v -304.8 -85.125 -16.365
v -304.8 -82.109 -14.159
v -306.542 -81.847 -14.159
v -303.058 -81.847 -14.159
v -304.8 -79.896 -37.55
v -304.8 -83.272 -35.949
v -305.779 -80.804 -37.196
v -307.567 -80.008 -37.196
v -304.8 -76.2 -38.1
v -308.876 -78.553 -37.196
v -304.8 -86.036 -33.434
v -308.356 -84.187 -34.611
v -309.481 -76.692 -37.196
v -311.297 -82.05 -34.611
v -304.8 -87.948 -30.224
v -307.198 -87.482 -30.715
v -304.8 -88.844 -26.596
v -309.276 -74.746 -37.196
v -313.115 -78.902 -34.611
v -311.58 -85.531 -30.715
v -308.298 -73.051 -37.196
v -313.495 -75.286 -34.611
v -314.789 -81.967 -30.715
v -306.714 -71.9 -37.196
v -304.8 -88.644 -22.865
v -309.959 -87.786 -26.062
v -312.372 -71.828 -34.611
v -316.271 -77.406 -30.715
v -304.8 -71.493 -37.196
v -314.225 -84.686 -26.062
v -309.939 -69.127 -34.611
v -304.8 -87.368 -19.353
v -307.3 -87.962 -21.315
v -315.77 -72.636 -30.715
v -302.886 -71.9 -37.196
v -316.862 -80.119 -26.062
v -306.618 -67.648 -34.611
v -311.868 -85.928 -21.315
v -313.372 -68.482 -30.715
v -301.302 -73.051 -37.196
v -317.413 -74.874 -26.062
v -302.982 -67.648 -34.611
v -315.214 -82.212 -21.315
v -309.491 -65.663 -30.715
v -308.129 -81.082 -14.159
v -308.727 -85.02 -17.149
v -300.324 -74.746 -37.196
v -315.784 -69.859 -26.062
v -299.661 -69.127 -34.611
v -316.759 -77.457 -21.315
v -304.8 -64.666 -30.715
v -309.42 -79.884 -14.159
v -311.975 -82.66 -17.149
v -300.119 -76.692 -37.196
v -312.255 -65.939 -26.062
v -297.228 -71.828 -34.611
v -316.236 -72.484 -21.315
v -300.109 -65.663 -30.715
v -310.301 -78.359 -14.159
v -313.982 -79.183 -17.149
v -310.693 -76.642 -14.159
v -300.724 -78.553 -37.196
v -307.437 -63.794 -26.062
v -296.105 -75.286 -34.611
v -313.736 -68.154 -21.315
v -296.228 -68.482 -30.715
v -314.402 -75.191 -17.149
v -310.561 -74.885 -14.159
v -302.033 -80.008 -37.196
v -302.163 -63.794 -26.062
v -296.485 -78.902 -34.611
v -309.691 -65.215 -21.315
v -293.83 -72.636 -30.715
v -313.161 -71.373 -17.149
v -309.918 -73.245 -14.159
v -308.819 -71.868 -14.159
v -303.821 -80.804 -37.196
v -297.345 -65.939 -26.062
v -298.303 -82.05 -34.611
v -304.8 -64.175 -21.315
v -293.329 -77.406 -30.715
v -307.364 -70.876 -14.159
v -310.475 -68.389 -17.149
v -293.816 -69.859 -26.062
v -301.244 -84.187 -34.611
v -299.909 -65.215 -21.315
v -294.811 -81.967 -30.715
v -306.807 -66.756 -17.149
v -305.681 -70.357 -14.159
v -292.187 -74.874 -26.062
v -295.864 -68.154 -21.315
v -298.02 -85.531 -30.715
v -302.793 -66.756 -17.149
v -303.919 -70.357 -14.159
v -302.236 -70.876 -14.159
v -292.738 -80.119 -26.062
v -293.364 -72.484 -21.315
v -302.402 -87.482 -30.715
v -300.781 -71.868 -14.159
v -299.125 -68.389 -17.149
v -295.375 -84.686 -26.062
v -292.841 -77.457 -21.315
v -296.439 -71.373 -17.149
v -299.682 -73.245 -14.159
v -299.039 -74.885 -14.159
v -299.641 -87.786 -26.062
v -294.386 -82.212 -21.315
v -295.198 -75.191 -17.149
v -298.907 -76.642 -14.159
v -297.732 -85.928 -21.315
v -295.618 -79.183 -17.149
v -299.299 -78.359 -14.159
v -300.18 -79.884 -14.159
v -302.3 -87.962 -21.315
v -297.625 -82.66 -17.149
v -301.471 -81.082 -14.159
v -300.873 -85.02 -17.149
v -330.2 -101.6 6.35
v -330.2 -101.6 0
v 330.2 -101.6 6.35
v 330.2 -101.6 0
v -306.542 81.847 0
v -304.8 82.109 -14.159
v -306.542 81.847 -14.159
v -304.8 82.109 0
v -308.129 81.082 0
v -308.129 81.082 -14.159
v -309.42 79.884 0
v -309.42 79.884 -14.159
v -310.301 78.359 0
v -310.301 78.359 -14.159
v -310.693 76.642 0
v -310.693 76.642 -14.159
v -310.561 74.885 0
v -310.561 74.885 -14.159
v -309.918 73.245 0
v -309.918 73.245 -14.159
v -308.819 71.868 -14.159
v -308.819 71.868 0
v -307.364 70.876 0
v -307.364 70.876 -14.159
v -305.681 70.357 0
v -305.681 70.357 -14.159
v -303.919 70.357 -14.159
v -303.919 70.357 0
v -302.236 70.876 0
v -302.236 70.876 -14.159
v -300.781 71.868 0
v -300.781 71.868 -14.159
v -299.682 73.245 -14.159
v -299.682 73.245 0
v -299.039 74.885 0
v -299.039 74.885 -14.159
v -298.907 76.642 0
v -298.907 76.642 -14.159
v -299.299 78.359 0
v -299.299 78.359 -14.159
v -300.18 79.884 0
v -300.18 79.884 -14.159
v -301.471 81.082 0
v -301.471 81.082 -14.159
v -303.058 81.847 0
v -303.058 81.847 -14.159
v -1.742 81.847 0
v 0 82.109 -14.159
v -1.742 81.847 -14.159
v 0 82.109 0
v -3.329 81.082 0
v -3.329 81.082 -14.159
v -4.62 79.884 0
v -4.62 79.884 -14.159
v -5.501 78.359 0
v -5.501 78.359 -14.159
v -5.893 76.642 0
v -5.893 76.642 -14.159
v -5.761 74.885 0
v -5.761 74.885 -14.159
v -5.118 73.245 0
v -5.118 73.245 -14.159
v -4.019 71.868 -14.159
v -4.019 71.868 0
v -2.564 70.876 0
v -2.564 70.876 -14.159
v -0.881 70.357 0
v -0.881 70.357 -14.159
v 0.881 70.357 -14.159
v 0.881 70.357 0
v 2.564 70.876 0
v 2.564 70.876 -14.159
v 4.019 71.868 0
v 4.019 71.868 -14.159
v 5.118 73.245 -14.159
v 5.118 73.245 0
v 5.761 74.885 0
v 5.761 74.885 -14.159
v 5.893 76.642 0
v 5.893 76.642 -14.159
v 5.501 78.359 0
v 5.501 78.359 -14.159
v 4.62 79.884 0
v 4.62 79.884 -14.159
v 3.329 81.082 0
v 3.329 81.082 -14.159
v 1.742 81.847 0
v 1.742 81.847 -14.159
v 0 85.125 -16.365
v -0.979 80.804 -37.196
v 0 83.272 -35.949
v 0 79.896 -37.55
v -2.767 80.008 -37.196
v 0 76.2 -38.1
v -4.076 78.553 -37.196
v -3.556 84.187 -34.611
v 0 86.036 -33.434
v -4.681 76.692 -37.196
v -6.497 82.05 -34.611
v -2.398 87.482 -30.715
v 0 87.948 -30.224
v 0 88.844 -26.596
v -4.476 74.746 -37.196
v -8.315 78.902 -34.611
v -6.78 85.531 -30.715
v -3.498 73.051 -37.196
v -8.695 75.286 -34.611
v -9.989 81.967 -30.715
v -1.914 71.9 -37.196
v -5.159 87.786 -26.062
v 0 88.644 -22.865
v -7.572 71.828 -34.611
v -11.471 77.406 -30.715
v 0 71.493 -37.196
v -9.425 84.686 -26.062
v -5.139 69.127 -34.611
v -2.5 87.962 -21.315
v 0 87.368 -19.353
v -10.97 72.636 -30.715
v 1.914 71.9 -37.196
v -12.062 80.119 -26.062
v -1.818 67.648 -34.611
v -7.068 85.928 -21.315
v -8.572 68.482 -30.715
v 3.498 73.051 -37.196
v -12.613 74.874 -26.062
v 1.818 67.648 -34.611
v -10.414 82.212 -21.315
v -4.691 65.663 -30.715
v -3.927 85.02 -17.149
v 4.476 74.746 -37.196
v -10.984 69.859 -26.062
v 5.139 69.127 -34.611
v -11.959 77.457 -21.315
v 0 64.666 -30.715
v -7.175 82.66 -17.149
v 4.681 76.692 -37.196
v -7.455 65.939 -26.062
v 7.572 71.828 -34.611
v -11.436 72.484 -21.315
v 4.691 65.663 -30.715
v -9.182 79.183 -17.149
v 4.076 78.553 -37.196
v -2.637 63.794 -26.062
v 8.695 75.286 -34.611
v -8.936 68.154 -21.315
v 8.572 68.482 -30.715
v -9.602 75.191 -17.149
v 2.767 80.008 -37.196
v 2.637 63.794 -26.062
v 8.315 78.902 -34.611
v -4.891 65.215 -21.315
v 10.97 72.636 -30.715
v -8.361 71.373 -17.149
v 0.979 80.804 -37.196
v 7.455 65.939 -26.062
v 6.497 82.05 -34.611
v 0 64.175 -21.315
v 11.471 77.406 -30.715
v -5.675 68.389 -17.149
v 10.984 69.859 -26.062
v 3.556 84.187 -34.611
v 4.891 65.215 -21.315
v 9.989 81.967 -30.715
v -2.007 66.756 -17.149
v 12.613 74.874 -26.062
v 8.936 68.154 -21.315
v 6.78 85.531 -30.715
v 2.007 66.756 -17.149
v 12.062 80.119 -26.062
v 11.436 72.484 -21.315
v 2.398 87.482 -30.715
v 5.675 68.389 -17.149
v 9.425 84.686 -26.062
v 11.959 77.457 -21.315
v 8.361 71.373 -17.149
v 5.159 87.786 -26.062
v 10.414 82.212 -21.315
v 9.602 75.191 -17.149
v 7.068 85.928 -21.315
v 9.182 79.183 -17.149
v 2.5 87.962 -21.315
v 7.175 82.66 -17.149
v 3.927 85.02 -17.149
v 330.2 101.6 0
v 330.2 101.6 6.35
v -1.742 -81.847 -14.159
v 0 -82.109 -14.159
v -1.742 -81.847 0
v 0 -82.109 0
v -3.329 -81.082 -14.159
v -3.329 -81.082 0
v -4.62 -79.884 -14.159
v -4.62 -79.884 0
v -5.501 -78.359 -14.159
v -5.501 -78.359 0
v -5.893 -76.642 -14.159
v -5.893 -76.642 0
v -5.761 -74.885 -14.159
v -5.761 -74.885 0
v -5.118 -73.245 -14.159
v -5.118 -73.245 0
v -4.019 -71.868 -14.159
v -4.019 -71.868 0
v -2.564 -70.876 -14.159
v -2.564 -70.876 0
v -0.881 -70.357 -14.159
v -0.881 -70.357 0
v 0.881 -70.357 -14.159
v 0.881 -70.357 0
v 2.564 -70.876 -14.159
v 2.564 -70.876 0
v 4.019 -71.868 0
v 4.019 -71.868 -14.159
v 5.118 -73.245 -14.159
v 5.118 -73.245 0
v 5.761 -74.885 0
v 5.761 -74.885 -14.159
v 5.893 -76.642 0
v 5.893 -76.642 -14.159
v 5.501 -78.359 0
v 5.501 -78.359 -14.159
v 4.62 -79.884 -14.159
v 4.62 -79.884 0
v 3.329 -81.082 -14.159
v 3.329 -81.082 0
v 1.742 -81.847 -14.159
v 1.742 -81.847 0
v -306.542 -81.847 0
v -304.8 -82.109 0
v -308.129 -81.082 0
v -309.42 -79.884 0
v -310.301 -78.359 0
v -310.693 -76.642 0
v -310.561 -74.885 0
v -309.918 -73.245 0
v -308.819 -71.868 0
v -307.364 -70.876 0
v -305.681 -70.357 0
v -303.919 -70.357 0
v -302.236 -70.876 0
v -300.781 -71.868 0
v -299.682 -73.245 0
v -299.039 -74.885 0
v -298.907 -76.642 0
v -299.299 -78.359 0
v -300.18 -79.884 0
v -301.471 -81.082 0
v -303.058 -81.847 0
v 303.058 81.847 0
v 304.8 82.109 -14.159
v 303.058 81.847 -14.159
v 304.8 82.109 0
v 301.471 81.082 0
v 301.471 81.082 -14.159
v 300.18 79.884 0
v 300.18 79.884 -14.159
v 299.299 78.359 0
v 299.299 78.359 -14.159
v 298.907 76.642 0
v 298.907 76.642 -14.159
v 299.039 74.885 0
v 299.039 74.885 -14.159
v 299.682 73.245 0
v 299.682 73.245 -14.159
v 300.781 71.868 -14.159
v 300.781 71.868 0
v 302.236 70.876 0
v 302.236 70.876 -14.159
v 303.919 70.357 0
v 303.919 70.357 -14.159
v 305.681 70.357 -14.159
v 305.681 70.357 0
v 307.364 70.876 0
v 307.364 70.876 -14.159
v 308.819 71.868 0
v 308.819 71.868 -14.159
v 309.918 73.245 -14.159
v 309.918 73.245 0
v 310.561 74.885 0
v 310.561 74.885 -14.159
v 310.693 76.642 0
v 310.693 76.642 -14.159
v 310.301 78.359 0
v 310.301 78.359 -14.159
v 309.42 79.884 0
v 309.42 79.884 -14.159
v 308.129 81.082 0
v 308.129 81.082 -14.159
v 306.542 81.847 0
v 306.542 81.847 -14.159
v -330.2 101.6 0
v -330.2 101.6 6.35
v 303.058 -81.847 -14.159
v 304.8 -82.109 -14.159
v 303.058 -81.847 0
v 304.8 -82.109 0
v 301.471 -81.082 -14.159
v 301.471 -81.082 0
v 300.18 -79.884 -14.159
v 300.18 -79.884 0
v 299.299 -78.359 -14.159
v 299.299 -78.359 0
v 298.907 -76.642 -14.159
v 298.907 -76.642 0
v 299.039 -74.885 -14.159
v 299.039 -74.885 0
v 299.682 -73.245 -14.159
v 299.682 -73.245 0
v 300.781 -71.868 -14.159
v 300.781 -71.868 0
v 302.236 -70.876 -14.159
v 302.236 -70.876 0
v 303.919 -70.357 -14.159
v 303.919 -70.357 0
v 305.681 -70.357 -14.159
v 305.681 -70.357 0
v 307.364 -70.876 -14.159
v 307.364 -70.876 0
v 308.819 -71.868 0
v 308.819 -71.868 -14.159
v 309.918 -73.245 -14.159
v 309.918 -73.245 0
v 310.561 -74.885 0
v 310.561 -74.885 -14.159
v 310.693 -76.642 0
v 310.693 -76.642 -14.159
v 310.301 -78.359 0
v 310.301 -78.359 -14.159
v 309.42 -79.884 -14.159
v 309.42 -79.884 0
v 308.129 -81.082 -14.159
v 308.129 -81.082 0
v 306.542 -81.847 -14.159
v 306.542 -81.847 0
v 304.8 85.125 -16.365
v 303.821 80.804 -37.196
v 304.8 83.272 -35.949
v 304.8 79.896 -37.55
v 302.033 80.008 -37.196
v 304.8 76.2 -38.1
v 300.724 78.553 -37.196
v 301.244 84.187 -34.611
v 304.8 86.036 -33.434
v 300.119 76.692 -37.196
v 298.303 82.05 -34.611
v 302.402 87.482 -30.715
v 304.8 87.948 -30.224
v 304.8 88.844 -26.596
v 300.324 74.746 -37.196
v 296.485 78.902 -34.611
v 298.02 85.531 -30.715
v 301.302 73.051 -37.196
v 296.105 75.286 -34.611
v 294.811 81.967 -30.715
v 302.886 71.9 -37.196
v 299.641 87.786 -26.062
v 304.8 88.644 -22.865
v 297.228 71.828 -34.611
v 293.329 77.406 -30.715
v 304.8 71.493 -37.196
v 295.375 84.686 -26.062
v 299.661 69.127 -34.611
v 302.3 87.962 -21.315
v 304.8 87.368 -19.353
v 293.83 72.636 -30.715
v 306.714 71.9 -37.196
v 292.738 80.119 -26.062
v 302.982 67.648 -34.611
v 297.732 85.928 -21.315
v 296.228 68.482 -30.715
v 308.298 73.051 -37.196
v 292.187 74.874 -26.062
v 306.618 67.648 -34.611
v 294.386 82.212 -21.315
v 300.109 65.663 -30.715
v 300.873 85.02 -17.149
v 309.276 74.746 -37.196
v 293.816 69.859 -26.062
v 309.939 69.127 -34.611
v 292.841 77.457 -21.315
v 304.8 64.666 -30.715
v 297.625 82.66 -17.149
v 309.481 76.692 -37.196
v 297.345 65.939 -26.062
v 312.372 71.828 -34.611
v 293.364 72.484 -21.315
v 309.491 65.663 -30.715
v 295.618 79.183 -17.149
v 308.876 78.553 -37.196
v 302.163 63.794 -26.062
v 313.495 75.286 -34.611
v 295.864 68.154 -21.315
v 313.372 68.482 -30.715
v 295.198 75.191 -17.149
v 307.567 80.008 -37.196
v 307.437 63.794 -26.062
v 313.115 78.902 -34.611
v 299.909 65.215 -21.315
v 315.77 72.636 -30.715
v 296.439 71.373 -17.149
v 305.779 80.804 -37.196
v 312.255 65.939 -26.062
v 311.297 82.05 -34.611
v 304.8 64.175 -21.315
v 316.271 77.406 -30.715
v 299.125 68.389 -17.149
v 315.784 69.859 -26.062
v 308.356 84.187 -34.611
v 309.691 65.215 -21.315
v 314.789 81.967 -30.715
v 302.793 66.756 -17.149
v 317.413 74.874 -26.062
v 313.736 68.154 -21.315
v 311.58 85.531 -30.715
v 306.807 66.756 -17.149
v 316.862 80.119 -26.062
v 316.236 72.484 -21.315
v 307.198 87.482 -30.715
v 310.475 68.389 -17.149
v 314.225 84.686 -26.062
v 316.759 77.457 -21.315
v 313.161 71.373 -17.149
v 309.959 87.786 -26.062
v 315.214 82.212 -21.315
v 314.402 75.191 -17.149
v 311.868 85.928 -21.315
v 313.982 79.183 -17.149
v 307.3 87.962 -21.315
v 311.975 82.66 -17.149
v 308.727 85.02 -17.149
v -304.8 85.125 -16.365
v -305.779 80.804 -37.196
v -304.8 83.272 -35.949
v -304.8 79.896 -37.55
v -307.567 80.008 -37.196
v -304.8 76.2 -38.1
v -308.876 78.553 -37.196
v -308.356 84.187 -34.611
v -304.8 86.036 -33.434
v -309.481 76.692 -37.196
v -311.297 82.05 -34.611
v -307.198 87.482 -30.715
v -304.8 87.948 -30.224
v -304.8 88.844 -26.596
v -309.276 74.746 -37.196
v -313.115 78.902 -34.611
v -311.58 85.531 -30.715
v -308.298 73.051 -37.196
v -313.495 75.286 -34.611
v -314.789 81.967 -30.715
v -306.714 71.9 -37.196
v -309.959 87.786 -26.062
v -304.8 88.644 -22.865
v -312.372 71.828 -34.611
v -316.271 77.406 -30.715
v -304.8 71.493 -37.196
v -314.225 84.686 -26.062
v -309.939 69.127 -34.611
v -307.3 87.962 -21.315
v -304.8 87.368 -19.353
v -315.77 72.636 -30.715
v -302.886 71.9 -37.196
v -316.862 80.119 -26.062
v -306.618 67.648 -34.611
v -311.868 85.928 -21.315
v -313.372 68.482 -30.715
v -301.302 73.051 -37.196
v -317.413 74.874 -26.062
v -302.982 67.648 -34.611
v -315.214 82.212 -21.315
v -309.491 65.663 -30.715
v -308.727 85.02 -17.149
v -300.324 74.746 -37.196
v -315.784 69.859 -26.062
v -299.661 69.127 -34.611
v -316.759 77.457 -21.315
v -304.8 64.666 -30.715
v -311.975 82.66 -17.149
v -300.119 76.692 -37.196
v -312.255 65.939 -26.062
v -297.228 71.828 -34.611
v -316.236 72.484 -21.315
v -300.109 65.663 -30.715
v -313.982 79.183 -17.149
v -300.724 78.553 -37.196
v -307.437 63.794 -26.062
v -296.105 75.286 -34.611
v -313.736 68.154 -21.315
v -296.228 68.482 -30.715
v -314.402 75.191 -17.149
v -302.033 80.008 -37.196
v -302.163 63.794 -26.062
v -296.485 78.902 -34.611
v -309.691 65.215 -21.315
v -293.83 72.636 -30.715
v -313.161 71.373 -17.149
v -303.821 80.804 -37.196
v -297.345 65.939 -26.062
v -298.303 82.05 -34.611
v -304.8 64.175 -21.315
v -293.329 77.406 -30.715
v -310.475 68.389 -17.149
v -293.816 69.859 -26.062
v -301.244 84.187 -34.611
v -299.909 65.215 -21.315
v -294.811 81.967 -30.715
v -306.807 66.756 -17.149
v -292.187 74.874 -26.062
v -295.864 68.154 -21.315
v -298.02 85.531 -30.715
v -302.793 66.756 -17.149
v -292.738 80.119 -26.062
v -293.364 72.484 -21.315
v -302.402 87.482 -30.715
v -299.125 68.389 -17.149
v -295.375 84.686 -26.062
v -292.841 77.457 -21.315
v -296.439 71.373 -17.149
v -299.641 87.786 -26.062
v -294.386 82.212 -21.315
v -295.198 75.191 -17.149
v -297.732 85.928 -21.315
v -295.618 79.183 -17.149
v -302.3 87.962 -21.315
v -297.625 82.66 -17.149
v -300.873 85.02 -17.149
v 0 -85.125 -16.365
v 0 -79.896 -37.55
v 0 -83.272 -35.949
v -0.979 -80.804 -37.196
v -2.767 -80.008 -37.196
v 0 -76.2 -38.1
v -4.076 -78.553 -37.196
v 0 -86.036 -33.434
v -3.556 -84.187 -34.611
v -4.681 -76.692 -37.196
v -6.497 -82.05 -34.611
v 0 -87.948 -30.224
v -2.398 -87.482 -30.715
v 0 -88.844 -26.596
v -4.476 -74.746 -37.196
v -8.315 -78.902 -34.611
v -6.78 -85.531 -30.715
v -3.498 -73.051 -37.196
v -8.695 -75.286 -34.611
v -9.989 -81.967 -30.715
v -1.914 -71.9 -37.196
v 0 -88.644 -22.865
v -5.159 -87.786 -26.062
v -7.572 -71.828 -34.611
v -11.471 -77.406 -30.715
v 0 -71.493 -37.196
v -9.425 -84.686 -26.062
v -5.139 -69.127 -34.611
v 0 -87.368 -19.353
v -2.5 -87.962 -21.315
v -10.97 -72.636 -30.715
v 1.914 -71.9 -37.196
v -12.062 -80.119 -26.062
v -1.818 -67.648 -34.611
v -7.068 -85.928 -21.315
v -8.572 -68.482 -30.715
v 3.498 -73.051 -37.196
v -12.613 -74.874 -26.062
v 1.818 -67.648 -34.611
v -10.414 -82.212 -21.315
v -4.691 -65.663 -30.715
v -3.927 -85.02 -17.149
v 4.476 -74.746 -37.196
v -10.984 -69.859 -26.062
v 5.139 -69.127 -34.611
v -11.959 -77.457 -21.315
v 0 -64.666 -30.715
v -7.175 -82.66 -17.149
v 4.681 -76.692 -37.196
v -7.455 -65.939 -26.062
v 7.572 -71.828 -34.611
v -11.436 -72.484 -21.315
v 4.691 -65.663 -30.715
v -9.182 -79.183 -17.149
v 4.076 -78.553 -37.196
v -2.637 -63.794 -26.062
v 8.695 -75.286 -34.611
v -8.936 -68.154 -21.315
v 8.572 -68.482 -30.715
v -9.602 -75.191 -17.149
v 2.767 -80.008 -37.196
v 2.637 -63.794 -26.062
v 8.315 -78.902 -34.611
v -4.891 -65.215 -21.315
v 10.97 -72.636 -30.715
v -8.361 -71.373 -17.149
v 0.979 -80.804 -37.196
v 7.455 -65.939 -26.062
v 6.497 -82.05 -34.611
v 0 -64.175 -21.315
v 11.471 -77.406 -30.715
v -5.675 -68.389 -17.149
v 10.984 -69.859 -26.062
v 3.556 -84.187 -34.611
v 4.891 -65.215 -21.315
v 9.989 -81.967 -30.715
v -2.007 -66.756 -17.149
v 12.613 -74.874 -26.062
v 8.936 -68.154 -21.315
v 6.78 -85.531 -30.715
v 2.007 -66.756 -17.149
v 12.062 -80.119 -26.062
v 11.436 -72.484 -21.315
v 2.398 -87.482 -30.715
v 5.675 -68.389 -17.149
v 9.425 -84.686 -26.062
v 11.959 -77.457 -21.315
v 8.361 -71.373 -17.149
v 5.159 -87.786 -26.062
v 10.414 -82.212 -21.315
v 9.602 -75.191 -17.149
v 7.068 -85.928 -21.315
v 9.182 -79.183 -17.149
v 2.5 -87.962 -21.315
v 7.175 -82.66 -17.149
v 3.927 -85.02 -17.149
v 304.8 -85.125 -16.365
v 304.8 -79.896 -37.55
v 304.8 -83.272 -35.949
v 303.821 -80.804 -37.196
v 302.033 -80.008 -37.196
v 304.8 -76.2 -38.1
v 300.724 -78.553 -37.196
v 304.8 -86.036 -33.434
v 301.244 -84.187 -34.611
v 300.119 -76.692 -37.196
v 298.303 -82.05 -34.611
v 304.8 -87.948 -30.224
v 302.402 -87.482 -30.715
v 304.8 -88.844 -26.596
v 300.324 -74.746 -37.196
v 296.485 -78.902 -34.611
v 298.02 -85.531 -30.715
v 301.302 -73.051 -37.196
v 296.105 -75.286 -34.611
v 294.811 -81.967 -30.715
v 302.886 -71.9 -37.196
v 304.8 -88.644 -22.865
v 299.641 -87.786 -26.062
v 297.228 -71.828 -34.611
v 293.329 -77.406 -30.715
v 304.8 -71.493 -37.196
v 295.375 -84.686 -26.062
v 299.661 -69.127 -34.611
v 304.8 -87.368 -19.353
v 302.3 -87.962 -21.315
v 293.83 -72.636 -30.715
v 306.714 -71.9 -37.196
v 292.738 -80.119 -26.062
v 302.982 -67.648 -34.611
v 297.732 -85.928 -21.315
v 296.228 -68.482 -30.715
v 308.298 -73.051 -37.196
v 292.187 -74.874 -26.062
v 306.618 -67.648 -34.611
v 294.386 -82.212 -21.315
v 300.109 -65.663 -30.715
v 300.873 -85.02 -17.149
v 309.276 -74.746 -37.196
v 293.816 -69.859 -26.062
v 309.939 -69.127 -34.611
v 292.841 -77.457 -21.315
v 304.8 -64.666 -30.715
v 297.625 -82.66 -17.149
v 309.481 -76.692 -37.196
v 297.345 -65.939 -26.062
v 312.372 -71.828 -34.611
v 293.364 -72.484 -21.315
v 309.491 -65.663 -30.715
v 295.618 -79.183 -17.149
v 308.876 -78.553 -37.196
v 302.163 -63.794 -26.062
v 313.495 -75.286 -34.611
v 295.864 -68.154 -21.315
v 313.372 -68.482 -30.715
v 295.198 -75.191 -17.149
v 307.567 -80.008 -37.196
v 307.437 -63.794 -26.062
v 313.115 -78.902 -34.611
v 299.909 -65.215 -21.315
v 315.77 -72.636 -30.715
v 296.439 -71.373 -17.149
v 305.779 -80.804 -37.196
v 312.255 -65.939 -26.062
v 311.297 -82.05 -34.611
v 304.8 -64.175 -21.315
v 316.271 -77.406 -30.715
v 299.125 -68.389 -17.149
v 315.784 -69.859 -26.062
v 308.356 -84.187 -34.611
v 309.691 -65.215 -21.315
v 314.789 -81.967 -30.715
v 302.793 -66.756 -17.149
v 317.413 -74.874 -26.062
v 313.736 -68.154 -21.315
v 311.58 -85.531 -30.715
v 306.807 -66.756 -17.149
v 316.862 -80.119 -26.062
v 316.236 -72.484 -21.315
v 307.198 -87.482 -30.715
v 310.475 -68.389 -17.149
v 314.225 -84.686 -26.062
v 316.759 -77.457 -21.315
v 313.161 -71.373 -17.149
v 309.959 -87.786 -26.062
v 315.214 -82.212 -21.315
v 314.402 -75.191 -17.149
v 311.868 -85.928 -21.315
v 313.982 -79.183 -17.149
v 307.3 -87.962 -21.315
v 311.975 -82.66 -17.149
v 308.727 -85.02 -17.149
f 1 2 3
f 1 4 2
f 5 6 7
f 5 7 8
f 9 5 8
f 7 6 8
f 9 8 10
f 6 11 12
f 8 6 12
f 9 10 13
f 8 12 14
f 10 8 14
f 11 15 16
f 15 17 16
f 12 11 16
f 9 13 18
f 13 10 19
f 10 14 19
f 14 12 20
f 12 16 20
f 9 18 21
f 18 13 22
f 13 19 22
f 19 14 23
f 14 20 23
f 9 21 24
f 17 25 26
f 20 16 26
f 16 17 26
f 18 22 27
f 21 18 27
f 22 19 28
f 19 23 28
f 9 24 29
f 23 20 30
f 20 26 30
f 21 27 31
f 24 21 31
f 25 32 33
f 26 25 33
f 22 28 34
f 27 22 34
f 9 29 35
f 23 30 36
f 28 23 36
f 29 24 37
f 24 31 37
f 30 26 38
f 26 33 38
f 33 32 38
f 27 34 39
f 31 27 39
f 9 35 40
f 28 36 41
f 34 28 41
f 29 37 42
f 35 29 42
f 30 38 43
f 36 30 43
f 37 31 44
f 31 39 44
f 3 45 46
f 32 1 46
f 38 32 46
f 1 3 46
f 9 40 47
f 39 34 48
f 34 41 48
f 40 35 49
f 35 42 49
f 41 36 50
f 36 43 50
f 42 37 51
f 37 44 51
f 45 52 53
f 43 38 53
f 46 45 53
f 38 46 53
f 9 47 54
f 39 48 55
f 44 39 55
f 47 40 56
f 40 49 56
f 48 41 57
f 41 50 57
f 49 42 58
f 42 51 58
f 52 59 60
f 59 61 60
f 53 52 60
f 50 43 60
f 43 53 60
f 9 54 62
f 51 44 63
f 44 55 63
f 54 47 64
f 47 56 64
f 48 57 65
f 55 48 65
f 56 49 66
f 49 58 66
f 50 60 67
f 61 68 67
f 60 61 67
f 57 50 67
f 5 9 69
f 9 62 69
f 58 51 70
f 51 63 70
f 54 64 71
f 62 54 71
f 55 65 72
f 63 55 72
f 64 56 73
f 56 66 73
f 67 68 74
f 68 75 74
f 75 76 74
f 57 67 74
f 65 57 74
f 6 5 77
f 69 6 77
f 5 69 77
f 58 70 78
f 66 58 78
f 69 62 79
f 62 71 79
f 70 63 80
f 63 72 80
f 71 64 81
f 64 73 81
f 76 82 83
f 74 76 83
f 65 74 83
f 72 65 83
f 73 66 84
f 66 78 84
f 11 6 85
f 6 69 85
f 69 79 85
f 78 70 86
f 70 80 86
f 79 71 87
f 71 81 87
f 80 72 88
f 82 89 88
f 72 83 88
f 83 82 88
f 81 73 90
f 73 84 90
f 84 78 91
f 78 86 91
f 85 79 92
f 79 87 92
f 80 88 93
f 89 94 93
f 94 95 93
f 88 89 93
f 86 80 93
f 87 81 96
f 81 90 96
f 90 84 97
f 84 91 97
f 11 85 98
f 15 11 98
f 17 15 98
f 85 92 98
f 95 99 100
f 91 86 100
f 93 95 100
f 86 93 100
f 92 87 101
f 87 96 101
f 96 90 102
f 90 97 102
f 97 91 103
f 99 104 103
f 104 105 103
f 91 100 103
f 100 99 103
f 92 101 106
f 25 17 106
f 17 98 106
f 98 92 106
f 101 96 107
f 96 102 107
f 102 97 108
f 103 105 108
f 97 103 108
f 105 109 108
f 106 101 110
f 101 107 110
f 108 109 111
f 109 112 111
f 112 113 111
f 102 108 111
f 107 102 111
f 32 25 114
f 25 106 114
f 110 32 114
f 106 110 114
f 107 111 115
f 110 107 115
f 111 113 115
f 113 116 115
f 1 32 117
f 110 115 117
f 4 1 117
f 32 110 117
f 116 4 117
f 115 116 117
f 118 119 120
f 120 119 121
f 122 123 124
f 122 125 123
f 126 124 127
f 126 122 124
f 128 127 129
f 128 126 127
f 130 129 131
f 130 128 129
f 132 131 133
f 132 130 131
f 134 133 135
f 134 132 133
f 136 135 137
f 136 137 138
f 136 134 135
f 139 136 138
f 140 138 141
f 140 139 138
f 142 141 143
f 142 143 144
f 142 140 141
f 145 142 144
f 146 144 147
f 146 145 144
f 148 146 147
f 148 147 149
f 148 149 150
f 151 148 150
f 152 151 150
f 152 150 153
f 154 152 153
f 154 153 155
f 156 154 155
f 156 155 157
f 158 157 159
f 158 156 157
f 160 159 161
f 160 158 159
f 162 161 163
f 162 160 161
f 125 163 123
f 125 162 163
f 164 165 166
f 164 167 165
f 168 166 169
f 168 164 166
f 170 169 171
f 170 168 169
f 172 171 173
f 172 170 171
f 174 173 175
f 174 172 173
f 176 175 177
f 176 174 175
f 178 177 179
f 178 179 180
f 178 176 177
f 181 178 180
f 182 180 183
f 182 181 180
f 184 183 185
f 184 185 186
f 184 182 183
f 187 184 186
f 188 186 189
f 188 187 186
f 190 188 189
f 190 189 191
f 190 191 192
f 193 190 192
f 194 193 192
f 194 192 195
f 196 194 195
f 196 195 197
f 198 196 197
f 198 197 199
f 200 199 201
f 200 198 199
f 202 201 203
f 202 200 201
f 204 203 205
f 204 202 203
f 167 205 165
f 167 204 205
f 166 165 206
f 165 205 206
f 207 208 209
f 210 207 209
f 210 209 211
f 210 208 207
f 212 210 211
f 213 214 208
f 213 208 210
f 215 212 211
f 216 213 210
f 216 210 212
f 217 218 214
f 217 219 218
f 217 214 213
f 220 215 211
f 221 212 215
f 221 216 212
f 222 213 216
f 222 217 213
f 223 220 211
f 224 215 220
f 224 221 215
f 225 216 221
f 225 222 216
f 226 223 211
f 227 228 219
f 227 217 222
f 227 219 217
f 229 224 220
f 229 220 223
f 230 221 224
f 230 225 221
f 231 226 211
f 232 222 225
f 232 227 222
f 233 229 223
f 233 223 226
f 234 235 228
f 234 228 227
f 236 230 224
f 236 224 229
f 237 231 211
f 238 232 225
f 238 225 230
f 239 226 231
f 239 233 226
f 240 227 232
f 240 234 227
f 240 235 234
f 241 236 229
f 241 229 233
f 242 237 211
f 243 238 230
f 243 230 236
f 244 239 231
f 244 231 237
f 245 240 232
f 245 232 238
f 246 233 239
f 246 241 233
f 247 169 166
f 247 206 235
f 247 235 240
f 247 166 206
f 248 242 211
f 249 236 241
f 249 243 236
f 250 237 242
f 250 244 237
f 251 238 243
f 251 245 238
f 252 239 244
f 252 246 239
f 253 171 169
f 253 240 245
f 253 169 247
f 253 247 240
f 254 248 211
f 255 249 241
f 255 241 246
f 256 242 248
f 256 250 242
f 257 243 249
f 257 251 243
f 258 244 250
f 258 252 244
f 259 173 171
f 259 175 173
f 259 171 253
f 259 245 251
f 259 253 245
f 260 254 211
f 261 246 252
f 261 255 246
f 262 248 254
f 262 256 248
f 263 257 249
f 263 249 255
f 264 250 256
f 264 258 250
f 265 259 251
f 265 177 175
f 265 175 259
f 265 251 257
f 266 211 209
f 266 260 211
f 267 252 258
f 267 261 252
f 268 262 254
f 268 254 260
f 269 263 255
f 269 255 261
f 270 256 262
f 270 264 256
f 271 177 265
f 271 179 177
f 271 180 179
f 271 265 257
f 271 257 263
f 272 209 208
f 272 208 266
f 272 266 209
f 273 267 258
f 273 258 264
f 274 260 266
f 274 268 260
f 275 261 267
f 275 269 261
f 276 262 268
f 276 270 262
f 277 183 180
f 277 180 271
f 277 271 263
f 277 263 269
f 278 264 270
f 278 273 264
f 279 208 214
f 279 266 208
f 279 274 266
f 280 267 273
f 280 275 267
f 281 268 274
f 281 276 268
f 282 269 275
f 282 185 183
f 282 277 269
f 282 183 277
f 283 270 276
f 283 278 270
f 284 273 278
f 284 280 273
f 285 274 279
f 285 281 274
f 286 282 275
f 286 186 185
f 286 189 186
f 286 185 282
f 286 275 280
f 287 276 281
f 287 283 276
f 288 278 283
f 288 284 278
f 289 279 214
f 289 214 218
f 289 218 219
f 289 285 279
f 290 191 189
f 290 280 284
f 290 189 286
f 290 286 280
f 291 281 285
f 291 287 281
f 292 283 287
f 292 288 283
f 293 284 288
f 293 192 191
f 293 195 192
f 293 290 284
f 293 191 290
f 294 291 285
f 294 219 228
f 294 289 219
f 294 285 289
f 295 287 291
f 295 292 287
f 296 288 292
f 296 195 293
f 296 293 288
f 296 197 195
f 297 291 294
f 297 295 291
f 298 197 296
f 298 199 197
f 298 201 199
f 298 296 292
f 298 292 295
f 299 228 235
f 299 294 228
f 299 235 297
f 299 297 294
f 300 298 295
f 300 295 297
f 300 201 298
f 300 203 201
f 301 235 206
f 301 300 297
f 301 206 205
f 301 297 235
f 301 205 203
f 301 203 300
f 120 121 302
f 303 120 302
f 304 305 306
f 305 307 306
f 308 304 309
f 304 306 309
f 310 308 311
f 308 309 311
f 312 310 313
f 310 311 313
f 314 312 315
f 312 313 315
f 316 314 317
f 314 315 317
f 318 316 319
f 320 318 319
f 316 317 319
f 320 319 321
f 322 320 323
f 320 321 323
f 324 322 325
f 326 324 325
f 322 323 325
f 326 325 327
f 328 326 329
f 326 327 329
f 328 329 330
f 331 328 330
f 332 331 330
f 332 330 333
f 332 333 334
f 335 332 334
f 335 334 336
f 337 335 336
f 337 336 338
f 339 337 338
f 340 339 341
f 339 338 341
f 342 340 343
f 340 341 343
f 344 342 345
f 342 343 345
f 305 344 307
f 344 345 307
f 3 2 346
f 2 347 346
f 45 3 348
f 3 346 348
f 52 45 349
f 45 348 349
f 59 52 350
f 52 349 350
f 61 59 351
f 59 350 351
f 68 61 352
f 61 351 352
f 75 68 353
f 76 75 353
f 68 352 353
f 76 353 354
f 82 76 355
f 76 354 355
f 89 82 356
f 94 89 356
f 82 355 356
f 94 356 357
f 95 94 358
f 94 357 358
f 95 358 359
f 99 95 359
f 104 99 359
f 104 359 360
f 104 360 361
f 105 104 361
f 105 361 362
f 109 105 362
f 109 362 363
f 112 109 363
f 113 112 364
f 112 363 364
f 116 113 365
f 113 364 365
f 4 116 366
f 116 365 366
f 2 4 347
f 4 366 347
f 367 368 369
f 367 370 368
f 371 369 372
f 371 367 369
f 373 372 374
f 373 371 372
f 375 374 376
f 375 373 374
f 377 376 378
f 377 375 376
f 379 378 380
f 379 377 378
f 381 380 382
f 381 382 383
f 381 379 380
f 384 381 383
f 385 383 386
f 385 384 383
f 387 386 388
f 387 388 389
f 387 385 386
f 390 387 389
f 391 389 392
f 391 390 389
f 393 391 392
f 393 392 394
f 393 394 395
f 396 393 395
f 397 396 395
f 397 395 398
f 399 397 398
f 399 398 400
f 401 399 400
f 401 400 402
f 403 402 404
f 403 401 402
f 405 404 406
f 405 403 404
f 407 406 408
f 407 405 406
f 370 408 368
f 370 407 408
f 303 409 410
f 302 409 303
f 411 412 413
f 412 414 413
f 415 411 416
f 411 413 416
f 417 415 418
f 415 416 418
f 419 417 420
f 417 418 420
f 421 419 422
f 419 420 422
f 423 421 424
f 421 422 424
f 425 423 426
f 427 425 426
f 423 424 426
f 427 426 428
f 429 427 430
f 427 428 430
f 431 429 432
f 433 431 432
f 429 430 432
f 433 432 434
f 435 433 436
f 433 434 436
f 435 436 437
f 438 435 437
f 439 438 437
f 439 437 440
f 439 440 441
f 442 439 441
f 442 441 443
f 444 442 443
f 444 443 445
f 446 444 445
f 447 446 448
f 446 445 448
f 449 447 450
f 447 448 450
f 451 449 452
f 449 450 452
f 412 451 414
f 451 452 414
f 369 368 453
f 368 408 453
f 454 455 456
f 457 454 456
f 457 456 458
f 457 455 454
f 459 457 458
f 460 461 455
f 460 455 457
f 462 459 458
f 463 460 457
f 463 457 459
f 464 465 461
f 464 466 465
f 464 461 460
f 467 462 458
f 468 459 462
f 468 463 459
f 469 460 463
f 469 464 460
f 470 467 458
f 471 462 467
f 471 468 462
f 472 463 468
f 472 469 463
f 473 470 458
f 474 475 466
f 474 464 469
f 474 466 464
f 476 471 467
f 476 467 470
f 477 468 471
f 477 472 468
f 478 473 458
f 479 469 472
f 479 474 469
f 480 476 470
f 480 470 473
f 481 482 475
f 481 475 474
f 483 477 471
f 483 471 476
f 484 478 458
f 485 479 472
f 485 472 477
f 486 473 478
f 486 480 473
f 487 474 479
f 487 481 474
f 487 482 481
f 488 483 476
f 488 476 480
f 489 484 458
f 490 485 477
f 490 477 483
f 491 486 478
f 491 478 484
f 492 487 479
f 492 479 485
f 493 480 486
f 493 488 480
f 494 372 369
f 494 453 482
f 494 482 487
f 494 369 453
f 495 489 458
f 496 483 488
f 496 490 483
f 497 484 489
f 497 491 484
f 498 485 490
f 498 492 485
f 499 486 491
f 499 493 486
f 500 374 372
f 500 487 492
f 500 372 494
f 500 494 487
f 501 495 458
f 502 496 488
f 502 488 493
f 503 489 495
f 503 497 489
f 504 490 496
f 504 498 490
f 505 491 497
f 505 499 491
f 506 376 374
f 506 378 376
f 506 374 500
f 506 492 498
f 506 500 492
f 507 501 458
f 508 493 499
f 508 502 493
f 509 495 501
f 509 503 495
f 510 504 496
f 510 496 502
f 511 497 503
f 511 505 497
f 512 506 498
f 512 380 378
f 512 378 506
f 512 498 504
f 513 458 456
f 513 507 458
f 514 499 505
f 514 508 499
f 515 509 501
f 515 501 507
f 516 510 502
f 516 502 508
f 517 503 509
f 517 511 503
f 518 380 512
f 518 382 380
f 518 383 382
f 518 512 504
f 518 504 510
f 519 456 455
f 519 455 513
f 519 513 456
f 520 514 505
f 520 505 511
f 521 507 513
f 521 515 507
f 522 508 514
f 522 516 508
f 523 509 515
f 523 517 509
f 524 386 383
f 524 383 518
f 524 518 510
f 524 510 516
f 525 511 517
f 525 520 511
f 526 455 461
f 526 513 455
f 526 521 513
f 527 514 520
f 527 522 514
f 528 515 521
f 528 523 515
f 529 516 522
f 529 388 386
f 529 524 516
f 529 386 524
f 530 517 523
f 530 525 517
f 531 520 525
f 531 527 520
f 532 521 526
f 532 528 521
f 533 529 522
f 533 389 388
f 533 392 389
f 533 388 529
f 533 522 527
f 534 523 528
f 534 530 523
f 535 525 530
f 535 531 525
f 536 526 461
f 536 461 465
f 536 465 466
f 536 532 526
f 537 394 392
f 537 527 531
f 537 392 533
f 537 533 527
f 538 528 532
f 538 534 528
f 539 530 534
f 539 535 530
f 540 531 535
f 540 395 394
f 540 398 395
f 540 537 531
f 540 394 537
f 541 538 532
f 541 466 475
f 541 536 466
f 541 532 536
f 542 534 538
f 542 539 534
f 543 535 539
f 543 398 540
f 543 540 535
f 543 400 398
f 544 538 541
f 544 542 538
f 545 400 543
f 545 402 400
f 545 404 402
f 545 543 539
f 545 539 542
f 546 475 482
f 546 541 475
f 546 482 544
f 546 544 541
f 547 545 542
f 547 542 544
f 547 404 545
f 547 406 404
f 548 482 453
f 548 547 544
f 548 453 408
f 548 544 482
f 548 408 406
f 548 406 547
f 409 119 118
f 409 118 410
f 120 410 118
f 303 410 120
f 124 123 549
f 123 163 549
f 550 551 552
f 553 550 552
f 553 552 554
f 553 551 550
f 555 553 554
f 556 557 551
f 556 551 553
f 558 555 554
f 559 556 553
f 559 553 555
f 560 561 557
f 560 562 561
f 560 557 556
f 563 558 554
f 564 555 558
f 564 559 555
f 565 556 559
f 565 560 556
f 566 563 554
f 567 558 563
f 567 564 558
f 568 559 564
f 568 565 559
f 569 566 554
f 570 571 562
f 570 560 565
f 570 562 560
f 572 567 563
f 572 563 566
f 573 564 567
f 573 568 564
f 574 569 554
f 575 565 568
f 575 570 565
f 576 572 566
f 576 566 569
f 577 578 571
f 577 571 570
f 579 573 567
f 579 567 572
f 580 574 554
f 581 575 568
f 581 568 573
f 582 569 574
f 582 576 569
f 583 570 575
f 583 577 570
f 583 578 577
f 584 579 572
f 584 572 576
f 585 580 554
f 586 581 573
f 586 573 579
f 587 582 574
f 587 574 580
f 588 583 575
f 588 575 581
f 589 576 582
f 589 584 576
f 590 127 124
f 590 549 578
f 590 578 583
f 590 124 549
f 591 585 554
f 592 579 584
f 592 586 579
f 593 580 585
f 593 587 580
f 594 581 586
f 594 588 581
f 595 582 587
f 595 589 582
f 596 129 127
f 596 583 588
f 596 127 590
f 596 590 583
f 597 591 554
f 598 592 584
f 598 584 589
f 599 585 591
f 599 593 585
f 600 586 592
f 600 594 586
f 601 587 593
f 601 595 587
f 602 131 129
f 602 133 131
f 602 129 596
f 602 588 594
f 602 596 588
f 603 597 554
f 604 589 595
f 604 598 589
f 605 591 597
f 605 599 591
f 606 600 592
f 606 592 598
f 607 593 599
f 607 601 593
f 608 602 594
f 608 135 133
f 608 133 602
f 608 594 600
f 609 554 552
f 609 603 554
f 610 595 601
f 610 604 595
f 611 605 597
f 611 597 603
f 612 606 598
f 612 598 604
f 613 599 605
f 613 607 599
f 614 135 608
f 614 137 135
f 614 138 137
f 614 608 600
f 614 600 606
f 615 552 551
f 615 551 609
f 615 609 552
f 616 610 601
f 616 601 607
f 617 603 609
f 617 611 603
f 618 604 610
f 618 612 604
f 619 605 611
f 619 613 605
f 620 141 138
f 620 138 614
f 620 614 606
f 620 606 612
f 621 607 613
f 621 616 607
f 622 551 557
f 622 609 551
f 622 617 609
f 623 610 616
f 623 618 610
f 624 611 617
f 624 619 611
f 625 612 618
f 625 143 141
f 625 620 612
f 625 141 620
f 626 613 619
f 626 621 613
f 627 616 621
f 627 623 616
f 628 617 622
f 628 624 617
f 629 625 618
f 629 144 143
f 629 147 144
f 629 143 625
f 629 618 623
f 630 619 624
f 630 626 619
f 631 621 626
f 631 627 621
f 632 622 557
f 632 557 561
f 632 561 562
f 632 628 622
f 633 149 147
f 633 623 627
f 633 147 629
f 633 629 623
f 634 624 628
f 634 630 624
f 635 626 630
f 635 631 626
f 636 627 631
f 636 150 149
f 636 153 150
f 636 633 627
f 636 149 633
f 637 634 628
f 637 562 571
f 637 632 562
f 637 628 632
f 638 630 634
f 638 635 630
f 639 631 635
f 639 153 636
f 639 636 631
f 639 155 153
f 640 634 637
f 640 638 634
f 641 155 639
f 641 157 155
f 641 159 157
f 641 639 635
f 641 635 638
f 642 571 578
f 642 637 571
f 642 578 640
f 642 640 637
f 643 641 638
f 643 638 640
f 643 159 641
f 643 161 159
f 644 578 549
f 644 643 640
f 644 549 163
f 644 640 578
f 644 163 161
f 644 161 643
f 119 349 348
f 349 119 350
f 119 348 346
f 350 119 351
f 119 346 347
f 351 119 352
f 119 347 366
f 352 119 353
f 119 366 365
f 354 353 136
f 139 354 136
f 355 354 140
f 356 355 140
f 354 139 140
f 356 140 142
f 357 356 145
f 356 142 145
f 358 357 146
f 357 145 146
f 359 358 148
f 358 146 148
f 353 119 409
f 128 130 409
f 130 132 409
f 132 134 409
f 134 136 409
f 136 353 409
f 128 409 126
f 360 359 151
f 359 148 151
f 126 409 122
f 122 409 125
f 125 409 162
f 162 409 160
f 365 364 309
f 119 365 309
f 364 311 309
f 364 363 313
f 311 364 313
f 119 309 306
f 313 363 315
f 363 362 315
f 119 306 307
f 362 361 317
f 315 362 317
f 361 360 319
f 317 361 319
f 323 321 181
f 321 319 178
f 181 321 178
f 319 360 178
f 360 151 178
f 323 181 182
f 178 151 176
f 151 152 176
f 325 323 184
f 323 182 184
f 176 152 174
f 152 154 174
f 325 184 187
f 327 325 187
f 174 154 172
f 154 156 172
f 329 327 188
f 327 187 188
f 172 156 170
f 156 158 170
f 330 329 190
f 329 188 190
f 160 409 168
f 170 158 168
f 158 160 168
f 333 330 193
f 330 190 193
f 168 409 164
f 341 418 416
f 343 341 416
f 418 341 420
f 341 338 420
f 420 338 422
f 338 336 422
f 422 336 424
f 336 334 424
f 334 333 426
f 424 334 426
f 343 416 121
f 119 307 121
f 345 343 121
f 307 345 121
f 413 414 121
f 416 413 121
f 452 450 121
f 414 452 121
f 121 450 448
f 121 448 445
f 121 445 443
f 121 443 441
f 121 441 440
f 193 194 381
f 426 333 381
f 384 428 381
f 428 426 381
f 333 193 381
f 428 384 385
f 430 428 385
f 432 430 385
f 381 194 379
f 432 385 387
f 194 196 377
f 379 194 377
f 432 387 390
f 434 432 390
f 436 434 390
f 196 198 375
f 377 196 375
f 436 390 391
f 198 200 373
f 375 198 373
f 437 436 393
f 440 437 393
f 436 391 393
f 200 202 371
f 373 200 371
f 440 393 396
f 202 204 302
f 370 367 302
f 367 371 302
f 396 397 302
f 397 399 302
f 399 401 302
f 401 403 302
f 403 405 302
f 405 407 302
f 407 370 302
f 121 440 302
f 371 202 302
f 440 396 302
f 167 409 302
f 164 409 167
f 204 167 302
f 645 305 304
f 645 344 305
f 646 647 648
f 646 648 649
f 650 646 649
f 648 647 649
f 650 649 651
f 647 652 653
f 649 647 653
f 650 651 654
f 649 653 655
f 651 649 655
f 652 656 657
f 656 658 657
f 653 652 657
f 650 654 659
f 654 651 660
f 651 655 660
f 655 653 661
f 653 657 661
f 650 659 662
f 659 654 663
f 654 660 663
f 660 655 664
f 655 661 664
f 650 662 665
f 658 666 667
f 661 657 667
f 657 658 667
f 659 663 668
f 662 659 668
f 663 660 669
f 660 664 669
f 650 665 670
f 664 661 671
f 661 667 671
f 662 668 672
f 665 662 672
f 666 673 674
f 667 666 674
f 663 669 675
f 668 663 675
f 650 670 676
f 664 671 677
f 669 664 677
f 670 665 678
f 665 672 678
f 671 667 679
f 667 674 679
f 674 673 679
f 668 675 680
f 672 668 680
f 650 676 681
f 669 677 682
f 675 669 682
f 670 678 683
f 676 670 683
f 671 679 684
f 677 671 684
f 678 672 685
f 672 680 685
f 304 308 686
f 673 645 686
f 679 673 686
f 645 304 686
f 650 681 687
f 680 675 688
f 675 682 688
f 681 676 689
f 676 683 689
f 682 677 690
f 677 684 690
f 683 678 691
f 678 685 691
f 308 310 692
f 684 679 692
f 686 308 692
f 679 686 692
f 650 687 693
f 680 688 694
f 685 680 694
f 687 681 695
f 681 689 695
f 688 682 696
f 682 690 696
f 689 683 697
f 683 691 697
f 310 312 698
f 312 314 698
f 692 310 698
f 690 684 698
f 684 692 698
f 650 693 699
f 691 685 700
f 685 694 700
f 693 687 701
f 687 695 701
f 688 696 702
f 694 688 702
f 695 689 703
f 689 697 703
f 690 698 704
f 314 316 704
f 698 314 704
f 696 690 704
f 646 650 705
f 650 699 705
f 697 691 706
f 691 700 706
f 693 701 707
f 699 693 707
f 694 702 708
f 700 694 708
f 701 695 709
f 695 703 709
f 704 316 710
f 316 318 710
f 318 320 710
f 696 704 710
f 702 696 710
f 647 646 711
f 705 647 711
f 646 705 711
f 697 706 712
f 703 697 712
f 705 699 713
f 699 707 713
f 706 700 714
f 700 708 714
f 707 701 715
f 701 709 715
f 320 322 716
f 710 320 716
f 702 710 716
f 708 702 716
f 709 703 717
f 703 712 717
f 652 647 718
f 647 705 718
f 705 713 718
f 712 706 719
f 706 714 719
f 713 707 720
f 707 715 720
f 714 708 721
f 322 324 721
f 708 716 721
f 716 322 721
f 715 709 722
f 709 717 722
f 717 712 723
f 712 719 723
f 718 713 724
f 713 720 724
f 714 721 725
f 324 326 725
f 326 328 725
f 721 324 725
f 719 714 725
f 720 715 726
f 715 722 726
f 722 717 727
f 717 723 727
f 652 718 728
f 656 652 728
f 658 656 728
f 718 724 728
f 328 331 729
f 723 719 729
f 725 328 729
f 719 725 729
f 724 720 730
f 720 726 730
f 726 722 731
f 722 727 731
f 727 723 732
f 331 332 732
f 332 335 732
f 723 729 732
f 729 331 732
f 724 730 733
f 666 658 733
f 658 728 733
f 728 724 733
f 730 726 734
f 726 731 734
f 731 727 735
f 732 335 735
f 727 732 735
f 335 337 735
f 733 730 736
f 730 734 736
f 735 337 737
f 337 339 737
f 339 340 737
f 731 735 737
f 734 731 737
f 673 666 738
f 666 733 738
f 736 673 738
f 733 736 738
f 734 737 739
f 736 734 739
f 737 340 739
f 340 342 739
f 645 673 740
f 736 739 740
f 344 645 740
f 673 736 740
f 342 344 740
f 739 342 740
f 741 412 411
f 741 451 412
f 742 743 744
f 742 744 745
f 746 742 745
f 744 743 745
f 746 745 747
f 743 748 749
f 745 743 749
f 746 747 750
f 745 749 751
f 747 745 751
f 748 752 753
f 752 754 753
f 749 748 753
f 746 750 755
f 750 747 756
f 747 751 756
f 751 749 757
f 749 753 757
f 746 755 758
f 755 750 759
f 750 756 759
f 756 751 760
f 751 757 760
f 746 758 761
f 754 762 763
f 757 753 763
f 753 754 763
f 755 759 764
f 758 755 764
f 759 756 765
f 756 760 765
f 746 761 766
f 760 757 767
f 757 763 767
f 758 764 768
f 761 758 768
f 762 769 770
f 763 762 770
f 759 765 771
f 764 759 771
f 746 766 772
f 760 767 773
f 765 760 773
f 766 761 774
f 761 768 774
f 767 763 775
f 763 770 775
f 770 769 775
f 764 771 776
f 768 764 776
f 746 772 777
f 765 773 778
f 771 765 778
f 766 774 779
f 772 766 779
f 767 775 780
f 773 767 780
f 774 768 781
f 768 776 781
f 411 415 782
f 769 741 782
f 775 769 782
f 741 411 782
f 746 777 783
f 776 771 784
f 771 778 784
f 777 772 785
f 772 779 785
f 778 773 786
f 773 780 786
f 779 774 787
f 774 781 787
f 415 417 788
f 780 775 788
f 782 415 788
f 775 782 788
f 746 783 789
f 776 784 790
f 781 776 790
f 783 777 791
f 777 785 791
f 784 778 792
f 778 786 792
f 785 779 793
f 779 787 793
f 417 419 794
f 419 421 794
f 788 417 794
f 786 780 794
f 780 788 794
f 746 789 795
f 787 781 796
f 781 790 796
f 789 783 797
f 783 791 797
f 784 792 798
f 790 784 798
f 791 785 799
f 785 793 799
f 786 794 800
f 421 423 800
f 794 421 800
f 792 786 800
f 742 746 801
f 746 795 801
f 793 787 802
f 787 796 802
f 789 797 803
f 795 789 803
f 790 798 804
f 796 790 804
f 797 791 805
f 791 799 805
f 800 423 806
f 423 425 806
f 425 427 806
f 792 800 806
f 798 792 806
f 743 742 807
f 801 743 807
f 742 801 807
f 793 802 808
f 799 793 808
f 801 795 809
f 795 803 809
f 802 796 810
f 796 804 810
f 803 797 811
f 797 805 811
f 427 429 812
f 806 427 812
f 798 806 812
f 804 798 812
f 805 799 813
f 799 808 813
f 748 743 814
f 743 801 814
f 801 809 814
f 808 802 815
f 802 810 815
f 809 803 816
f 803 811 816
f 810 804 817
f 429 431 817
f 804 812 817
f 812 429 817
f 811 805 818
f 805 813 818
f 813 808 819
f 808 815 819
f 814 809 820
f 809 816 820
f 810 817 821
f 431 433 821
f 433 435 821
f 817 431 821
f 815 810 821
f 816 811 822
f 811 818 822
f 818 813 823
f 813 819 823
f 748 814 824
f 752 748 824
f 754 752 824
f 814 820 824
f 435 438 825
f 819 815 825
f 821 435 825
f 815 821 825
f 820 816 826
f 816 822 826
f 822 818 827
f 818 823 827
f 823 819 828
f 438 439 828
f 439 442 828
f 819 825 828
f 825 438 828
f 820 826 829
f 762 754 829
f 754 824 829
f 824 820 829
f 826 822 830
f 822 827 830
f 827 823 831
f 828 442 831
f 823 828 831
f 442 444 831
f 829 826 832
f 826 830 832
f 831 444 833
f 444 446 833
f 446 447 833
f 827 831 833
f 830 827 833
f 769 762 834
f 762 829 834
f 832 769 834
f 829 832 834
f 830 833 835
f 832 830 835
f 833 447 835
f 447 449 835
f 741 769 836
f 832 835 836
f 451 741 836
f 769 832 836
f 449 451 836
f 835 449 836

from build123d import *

# Parameters (mm, degrees)
SKETCH1_W           = 660.4
SKETCH1_H           = 203.2
BOSS_EXTRUDE1_DEPTH = 6.35
LPATTERN1_COUNT     = 2
LPATTERN1_PITCH     = 304.8
LPATTERN1_COL_COUNT = 2
LPATTERN1_COL_PITCH = 304.8


with BuildPart() as part:
    # Sketch1 → Boss-Extrude1 (new body)
    with BuildSketch(Plane.XY):
        Rectangle(SKETCH1_W, SKETCH1_H)
    extrude(amount=BOSS_EXTRUDE1_DEPTH)

    # Sketch3 → Revolve1 (revolve)
    with BuildSketch(Plane(origin=(0, 0, 0), x_dir=(0, 0, -1), z_dir=(1, 0, 0))):
        with BuildLine():
            Line((0, -76.2), (38.1, -76.2))
            ThreePointArc((38.1, -76.2), (28.44332506, -88.529970502), (14.158555499, -82.10930838))
            Line((14.158555499, -82.10930838), (0, -82.10930838))
            Line((0, -82.10930838), (0, -76.2))
        make_face()
    revolve1 = revolve(axis=Axis((0, -76.2, 0), (0, 0, -1)))

    # Mirror1: Revolve1 across plane
    add(revolve1.mirror(Plane.ZX))

    # LPattern1: Revolve1 ×2
    with Locations(*[(i * LPATTERN1_PITCH, 0, 0) for i in range(1, LPATTERN1_COUNT)]):
        add(revolve1)

    # LPattern1 copy 1 sketch → LPattern1 copy 1 (revolve)
    with BuildSketch(Plane(origin=(304.8, 0, 0), x_dir=(0, 0, -1), z_dir=(1, 0, 0))):
        with BuildLine():
            Line((0, 76.2), (38.1, 76.2))
            ThreePointArc((38.1, 76.2), (28.44332506, 88.529970502), (14.158555499, 82.10930838))
            Line((14.158555499, 82.10930838), (0, 82.10930838))
            Line((0, 82.10930838), (0, 76.2))
        make_face()
    revolve(axis=Axis((304.8, 76.2, 0), (0, 0, 1)))

    # LPattern1 col: Revolve1 ×2
    with Locations(*[(-i * LPATTERN1_COL_PITCH, 0, 0) for i in range(1, LPATTERN1_COL_COUNT)]):
        add(revolve1)

    # LPattern1 col copy 1 sketch → LPattern1 col copy 1 (revolve)
    with BuildSketch(Plane(origin=(-304.8, 0, 0), x_dir=(0, 0, -1), z_dir=(1, 0, 0))):
        with BuildLine():
            Line((0, 76.2), (38.1, 76.2))
            ThreePointArc((38.1, 76.2), (28.44332506, 88.529970502), (14.158555499, 82.10930838))
            Line((14.158555499, 82.10930838), (0, 82.10930838))
            Line((0, 82.10930838), (0, 76.2))
        make_face()
    revolve(axis=Axis((-304.8, 76.2, 0), (0, 0, 1)))


solid = part.part
